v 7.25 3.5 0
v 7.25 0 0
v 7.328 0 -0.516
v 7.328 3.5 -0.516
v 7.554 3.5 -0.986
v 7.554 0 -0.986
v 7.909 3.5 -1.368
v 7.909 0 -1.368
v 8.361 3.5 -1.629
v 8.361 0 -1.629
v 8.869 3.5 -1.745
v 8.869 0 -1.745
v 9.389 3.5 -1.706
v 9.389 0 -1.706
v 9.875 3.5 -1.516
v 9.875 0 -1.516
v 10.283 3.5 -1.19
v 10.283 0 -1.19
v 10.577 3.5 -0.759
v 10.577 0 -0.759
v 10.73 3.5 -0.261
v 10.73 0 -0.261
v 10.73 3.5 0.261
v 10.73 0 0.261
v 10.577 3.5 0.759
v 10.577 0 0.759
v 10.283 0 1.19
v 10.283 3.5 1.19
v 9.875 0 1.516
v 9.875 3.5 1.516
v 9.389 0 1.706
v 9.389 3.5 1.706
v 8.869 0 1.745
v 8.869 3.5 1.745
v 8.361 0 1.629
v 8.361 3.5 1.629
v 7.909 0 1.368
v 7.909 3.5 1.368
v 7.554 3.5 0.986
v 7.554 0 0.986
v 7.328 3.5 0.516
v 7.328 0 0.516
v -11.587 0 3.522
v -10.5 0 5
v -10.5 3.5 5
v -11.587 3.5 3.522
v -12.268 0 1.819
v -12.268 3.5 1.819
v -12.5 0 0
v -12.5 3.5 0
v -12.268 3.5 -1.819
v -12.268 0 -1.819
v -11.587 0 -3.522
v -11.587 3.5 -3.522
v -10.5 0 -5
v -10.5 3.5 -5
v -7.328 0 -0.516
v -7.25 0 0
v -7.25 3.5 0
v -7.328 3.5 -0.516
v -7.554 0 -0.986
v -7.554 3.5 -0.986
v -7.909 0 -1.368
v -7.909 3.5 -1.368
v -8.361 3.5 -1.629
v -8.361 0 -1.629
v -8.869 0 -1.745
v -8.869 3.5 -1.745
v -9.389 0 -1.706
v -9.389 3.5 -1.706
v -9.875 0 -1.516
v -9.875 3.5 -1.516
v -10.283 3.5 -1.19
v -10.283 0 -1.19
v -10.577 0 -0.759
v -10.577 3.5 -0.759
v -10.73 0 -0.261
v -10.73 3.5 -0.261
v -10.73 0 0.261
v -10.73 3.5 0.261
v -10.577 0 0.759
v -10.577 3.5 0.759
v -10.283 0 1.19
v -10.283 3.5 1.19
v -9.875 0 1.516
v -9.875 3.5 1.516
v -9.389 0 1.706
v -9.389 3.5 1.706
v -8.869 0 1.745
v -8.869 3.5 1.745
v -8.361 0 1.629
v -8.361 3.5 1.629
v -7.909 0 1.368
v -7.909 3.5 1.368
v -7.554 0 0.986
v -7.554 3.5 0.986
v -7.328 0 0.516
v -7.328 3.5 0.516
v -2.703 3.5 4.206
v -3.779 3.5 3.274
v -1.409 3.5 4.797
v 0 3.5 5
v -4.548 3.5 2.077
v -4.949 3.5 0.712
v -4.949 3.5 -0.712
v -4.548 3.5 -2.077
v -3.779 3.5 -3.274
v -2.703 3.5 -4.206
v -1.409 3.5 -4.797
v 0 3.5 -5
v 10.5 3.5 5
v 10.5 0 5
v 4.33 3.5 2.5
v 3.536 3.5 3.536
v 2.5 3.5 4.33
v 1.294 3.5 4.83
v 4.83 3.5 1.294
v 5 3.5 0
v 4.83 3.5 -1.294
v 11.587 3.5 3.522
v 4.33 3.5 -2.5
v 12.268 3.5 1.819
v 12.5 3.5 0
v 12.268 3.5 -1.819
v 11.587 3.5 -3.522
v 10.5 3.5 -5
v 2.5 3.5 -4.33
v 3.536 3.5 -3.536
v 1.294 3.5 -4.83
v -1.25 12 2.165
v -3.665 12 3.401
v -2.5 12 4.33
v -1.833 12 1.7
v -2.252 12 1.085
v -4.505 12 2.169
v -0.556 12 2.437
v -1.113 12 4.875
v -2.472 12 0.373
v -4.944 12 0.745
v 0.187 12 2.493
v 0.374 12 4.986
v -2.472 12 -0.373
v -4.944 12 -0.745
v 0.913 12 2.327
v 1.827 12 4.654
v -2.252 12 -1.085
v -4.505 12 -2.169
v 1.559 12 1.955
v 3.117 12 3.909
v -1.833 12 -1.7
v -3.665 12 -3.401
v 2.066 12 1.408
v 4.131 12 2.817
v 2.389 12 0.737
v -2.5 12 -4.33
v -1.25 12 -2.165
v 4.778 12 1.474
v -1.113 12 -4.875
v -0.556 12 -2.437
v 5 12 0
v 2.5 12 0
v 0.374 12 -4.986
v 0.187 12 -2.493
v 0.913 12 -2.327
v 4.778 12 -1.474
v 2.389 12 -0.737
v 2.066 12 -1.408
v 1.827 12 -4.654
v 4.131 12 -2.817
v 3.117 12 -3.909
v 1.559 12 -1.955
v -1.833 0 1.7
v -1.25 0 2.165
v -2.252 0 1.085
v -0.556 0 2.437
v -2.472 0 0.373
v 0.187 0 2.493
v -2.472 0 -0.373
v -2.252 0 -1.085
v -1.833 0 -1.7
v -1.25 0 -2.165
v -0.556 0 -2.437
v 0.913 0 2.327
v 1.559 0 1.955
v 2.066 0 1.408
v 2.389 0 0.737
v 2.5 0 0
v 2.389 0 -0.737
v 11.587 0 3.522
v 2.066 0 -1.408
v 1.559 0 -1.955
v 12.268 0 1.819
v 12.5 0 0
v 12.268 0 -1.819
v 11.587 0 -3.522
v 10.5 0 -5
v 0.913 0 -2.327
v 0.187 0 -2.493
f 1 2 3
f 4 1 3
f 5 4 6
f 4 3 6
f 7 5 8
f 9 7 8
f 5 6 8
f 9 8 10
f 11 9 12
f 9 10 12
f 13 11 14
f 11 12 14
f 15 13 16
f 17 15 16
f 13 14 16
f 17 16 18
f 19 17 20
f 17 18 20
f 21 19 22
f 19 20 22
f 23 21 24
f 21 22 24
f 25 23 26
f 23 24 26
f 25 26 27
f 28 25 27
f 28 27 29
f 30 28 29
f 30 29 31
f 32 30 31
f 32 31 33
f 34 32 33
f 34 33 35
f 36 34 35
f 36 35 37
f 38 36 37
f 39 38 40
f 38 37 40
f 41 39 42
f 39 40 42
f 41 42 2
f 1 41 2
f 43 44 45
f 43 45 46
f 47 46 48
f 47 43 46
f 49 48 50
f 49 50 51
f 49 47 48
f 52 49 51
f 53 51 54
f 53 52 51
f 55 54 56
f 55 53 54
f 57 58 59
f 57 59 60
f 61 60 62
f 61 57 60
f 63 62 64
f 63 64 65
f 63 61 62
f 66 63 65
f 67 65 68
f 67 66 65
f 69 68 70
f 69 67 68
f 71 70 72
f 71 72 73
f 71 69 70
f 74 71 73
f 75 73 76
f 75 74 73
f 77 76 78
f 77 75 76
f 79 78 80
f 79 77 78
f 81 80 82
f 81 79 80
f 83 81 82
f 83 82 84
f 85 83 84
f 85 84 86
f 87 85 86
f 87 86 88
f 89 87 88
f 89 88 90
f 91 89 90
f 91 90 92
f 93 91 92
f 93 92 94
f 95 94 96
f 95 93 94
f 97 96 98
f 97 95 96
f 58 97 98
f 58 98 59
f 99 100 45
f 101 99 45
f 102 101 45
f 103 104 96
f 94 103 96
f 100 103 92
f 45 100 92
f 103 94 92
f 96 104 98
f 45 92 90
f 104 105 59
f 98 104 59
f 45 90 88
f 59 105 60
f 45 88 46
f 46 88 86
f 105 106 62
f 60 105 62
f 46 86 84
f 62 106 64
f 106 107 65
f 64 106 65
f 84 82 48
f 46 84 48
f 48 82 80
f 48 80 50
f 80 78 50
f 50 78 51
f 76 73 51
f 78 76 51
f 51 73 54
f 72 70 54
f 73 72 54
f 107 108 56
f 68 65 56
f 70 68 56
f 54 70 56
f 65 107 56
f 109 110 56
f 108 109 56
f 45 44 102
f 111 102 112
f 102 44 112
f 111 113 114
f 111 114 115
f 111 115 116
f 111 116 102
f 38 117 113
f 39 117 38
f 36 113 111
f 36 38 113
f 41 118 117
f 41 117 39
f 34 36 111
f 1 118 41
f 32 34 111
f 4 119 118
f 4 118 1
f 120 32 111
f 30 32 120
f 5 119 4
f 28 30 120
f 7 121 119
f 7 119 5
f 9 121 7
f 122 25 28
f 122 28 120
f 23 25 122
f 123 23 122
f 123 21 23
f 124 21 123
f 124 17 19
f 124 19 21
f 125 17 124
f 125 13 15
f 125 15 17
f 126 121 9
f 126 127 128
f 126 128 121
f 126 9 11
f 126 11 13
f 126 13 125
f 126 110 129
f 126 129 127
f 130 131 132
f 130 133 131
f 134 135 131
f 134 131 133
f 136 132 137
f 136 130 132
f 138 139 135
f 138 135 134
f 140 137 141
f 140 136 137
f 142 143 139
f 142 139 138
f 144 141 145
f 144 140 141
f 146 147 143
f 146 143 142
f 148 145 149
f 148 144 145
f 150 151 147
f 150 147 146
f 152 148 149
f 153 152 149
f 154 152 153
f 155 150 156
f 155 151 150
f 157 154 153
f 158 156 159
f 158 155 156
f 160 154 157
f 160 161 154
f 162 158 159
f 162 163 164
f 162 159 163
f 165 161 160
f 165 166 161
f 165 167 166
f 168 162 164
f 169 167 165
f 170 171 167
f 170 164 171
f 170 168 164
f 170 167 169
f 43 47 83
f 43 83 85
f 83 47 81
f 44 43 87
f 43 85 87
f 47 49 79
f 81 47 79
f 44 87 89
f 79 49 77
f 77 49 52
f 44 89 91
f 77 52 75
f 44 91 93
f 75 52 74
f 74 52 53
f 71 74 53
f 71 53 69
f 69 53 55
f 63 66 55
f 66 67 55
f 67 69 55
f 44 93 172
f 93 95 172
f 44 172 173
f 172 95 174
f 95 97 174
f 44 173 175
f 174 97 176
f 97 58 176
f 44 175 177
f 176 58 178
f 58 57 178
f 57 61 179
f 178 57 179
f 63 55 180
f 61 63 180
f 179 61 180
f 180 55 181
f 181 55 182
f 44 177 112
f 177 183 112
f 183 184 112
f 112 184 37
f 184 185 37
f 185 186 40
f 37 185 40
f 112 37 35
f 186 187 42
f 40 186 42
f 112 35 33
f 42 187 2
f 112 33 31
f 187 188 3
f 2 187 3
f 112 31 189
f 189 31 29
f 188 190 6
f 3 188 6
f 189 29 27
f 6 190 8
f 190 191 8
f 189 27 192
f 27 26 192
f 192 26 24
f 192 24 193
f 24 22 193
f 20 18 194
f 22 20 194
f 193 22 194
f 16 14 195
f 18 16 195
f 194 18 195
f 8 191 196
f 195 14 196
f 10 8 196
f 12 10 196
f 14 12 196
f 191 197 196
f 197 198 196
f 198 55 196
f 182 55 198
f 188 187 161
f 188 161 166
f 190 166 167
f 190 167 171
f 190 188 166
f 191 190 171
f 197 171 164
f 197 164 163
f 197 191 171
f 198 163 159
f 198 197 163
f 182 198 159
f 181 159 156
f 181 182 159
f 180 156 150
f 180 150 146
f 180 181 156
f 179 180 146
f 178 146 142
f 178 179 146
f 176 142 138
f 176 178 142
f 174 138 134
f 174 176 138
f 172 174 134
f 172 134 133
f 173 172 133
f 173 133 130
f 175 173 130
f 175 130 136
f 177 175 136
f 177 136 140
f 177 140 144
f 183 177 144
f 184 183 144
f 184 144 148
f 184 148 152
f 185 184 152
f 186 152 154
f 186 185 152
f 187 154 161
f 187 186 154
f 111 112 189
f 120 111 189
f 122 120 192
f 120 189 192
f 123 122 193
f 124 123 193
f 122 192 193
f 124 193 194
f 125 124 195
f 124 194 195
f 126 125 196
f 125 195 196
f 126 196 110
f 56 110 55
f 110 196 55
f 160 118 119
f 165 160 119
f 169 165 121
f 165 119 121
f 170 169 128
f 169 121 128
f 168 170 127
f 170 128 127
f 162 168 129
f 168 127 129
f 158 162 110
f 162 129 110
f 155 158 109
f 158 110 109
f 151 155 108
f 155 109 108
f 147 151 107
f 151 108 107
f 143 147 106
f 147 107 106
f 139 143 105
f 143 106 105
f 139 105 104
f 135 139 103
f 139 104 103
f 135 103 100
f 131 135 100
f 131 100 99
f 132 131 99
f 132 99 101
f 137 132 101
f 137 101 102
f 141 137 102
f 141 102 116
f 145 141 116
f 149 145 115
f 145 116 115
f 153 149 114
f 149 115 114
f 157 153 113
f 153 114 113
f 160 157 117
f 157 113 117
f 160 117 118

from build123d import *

# Parameters (mm, degrees)
SKETCH1_R           = 5
SKETCH1_R_2         = 2.5
BOSS_EXTRUDE1_DEPTH = 12
SKETCH2_R           = 1.75
BOSS_EXTRUDE2_DEPTH = 3.5


with BuildPart() as part:
    # Sketch1 → Boss-Extrude1 (new body)
    with BuildSketch(Plane(origin=(0, 0, 0), x_dir=(1, 0, 0), z_dir=(0, 1, 0))):
        Circle(SKETCH1_R)
        Circle(SKETCH1_R_2, mode=Mode.SUBTRACT)
    extrude(amount=BOSS_EXTRUDE1_DEPTH)

    # Sketch2 → Boss-Extrude2 (add)
    with BuildSketch(Plane(origin=(0, 0, 0), x_dir=(1, 0, 0), z_dir=(0, 1, 0))):
        with BuildLine():
            Line((0, -5), (-10.5, -5))
            ThreePointArc((-10.5, -5), (-12.5, 0), (-10.5, 5))
            Line((-10.5, 5), (0, 5))
            ThreePointArc((0, 5), (-5, 0), (0, -5))
        make_face()
        with Locations((-9, 0)):
            Circle(SKETCH2_R, mode=Mode.SUBTRACT)
    boss_extrude2 = extrude(amount=BOSS_EXTRUDE2_DEPTH)

    # Mirror1: Boss-Extrude2 across plane
    add(boss_extrude2.mirror(Plane(origin=(0, 0, 0), x_dir=(0, 0, 1), z_dir=(1, 0, 0))))


solid = part.part
